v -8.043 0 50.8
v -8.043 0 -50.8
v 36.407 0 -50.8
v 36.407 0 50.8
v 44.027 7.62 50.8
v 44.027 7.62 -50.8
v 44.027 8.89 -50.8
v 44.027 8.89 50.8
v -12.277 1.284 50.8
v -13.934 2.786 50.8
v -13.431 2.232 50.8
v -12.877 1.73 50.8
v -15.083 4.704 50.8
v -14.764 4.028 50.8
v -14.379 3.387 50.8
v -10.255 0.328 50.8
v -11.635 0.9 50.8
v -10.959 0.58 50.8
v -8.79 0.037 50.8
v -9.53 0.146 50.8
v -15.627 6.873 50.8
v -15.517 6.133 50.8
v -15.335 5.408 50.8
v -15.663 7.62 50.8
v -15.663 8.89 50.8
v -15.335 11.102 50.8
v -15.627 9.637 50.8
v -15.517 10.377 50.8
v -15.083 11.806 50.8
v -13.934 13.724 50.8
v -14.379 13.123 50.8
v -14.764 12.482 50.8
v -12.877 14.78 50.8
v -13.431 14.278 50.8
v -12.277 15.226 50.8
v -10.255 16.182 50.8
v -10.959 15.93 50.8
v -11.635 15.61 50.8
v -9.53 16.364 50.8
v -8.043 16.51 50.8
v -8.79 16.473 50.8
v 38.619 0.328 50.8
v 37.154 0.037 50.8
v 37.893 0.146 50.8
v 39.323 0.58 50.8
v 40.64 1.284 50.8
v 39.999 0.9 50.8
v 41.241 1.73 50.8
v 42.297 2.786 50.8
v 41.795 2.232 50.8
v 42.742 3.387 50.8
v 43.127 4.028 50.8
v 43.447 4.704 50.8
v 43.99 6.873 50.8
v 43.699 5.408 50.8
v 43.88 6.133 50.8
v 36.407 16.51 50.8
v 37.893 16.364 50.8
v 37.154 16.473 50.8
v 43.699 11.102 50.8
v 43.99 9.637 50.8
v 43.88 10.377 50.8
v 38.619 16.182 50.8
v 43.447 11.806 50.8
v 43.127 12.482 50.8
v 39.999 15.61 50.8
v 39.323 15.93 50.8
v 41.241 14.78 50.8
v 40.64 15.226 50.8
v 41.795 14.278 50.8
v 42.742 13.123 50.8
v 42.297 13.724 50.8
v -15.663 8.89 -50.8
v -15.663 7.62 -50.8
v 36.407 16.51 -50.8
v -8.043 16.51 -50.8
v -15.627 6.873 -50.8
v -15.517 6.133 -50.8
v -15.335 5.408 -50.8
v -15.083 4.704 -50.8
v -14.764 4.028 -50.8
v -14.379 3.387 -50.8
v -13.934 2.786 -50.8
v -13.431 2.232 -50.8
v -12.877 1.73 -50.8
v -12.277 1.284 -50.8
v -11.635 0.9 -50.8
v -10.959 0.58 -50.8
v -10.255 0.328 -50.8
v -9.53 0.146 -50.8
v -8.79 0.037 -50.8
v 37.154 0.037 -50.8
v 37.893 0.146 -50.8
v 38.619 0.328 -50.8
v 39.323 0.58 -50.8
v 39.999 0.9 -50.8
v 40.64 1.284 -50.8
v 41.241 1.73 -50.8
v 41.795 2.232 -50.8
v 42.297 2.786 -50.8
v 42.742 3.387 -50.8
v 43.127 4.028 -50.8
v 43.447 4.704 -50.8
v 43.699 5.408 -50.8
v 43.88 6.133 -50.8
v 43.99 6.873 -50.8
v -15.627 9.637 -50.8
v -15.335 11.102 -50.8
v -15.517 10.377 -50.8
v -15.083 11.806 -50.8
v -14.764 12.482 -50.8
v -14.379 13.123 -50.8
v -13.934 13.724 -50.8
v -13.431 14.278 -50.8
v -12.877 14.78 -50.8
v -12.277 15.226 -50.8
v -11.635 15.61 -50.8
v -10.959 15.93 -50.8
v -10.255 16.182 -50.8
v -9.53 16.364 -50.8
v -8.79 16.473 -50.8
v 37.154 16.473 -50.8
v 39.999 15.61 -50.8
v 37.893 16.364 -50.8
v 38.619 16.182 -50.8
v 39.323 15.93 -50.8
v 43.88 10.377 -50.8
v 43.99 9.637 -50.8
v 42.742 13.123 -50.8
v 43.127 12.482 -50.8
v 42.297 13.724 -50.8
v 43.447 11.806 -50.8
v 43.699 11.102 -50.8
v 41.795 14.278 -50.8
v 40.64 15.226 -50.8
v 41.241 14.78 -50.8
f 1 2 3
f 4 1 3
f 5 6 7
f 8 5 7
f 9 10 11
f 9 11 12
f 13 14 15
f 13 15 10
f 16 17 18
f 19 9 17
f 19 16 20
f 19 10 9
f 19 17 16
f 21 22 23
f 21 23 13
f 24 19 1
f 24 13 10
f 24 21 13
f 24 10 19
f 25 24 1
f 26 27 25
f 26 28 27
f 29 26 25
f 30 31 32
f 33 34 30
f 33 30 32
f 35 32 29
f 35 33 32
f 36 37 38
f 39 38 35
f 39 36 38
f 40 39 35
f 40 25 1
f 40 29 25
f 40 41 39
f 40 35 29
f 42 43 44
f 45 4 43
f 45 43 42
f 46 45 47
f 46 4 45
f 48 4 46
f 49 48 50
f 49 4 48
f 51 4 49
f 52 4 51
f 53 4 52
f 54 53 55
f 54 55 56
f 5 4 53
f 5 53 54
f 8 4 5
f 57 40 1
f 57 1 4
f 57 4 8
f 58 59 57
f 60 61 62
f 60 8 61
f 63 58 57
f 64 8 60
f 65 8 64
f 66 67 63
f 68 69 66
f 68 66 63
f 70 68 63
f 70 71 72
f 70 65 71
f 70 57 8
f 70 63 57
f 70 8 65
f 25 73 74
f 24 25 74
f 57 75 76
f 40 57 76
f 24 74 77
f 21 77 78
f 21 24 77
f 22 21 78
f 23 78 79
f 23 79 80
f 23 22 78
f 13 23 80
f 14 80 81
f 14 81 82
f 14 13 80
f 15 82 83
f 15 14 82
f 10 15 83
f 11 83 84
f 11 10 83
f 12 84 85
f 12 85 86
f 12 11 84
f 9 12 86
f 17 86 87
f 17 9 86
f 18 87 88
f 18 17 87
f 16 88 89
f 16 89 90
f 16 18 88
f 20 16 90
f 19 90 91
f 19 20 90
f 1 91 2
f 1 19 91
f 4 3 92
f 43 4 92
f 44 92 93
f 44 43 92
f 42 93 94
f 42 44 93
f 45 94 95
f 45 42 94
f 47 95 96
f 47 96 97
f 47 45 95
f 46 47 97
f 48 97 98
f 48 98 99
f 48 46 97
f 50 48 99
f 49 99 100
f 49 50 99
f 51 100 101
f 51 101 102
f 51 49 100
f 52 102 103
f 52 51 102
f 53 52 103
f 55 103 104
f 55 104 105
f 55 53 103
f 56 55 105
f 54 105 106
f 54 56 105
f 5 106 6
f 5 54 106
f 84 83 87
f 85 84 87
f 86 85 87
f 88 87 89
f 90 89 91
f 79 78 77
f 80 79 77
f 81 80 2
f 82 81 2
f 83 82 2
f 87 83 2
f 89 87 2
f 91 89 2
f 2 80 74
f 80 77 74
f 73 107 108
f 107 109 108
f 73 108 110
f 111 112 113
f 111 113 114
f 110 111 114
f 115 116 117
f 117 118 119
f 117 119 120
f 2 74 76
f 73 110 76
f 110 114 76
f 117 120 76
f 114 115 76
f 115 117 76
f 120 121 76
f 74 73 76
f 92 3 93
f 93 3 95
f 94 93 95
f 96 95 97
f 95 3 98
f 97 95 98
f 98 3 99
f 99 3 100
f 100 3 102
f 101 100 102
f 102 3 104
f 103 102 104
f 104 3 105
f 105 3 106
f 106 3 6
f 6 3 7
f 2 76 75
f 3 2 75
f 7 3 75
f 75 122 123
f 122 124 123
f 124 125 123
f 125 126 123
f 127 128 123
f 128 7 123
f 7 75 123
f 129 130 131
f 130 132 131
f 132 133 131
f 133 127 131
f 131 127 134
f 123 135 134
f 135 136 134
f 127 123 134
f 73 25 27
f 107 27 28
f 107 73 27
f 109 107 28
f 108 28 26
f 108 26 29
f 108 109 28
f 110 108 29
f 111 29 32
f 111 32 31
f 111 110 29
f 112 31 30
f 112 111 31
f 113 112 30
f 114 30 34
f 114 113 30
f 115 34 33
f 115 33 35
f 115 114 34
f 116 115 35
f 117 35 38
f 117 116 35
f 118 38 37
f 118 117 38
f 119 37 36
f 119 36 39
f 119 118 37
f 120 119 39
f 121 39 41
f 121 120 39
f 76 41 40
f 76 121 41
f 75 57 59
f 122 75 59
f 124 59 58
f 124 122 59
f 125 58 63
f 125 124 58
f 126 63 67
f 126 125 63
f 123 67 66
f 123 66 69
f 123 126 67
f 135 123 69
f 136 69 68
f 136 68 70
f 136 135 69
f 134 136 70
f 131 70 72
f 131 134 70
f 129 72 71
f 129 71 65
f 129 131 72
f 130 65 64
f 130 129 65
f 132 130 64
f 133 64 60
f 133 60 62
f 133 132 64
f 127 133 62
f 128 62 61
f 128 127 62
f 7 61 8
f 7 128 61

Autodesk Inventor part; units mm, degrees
ref_plane "YZ Plane" through (0, 0, 0) normal (1, 0, 0) x (0, 1, 0)
ref_plane "XZ Plane" through (0, 0, 0) normal (0, 1, 0) x (-1, 0, 0)
ref_plane "XY Plane" through (0, 0, 0) normal (0, 0, 1) x (1, 0, 0)
sketch "Sketch1" plane through (0, 0, 0) normal (0, 0, 1) x (1, 0, 0)
  line L0 (-15.6633, 0) -> (44.0267, 0)
  line L1 (44.0267, 0) -> (44.0267, 16.51)
  line L2 (44.0267, 16.51) -> (-15.6633, 16.51)
  line L3 (-15.6633, 16.51) -> (-15.6633, 0)
  point P0 (0, 0)
  dimension "d0" = 16.51
  dimension "d1" = 59.69
extrude "Extrusion1" add sketch "Sketch1" along normal mid plane 101.6
sketch "Sketch2" plane through (-9.3133, 16.51, 50.8) normal (0, 1, 0) x (1, 0, 0)
  line L0 (-6.35, 101.6) -> (-6.35, 0) projected
  line L1 (53.34, 0) -> (-6.35, 0) projected
  line L2 (53.34, 101.6) -> (53.34, 0) projected
  line L3 (-6.35, 101.6) -> (53.34, 101.6) projected
  line L4 (-6.35, 0) -> (-6.35, 101.6343) construction
  line L5 (-6.35, 101.6343) -> (53.34, 101.6343) construction
  line L6 (53.34, 101.6343) -> (53.34, 0) construction
  line L7 (53.34, 0) -> (-6.35, 0) construction
sketch "Sketch3" plane through (-15.6633, 0, 50.8) normal (0, -1, 0) x (1, 0, 0)
  line L0 (59.69, -101.6) -> (59.69, 0) projected
  line L1 (0, 0) -> (59.69, 0) projected
  line L2 (0, 0) -> (0, -101.6) projected
  line L3 (59.69, -101.6) -> (0, -101.6) projected
  line L4 (0, 0) -> (59.69, 0) projected
  line L5 (59.69, 0) -> (59.6518, -101.6224) construction
  line L6 (59.6518, -101.6224) -> (0, -101.6) construction
  line L7 (0, -101.6) -> (0.0382, 0.0224) construction
  line L8 (0.0382, 0.0224) -> (59.69, 0) construction
  point P0 (15.6633, -50.8)
sketch "Sketch4" plane through (44.0267, 0, 50.8) normal (0, 0, 1) x (1, 0, 0)
  line L0 (-59.69, 0) -> (0, 0) projected
  line L1 (0, 0) -> (0, 16.51) projected
  line L2 (0, 16.51) -> (-59.69, 16.51) projected
  line L3 (-59.69, 16.51) -> (-59.69, 0) projected
  line L4 (0, 16.51) -> (-59.69, 16.51) projected
  line L5 (-59.69, 16.51) -> (0.0244, 16.4214) construction
  line L6 (0.0244, 16.4214) -> (0, 0) construction
  line L7 (0, 0) -> (-59.7144, 0.0886) construction
  line L8 (-59.7144, 0.0886) -> (-59.69, 16.51) construction
sketch "Sketch5" plane through (0, 0, -50.8) normal (0, 0, -1) x (-1, 0, 0)
  line L0 (-44.0267, 0) -> (15.6633, 0) projected
  line L1 (15.6633, 0) -> (15.6633, 16.51) projected
  line L2 (15.6633, 16.51) -> (-44.0267, 16.51) projected
  line L3 (-44.0267, 16.51) -> (-44.0267, 0) projected
  line L4 (-44.0267, 16.51) -> (15.6633, 16.51) projected
  line L5 (-44.0267, 16.51) -> (15.6877, 16.4214) construction
  line L6 (15.6877, 16.4214) -> (15.6633, 0) construction
  line L7 (15.6633, 0) -> (-44.051, 0.0886) construction
  line L8 (-44.051, 0.0886) -> (-44.0267, 16.51) construction
  point P0 (0, 0)
sketch "Sketch6" plane through (44.0267, 0, 50.8) normal (1, 0, 0) x (0, 0, -1)
  line L0 (101.6, 16.51) -> (0, 16.51) projected
  line L1 (0, 0) -> (0, 16.51) projected
  line L2 (101.6, 0) -> (0, 0) projected
  line L3 (101.6, 16.51) -> (101.6, 0) projected
  line L4 (101.6, 16.51) -> (0, 16.51) projected
  line L5 (0, 16.51) -> (101.6, 16.51) construction
  line L6 (101.6, 16.51) -> (101.6, 0) construction
  line L7 (101.6, 0) -> (0, 0) construction
  line L8 (0, 0) -> (0, 16.51) construction
  point P0 (50.8, 0)
  dimension "d174" = 101.6
  dimension "d175" = 16.51
sketch "Sketch7" plane through (-15.6633, 0, 50.8) normal (-1, 0, 0) x (0, 0, 1)
  line L0 (-101.6, 16.51) -> (-101.6, 0) projected
  line L1 (-101.6, 16.51) -> (0, 16.51) construction
  line L2 (0, 16.51) -> (0, 0) construction
  line L3 (0, 0) -> (-101.6, 0) construction
  line L4 (-101.6, 0) -> (-101.6, 16.51) construction
  point P0 (-50.8, 0)
fillet "Fillet2" radius 7.62 4 edges at (44.0267, 16.51, 0) (44.0267, 0, 0) (-15.6633, 16.51, 0) (-15.6633, 0, 0)
decal "Decal1"
decal "Decal2"
decal "Decal3"
decal "Decal4"
decal "Decal5"
decal "Decal6"
properties part number "Tenergy NiMH Battery Pack 9.6V 2000mAh High Capacity Rechargeable RC Battery"
